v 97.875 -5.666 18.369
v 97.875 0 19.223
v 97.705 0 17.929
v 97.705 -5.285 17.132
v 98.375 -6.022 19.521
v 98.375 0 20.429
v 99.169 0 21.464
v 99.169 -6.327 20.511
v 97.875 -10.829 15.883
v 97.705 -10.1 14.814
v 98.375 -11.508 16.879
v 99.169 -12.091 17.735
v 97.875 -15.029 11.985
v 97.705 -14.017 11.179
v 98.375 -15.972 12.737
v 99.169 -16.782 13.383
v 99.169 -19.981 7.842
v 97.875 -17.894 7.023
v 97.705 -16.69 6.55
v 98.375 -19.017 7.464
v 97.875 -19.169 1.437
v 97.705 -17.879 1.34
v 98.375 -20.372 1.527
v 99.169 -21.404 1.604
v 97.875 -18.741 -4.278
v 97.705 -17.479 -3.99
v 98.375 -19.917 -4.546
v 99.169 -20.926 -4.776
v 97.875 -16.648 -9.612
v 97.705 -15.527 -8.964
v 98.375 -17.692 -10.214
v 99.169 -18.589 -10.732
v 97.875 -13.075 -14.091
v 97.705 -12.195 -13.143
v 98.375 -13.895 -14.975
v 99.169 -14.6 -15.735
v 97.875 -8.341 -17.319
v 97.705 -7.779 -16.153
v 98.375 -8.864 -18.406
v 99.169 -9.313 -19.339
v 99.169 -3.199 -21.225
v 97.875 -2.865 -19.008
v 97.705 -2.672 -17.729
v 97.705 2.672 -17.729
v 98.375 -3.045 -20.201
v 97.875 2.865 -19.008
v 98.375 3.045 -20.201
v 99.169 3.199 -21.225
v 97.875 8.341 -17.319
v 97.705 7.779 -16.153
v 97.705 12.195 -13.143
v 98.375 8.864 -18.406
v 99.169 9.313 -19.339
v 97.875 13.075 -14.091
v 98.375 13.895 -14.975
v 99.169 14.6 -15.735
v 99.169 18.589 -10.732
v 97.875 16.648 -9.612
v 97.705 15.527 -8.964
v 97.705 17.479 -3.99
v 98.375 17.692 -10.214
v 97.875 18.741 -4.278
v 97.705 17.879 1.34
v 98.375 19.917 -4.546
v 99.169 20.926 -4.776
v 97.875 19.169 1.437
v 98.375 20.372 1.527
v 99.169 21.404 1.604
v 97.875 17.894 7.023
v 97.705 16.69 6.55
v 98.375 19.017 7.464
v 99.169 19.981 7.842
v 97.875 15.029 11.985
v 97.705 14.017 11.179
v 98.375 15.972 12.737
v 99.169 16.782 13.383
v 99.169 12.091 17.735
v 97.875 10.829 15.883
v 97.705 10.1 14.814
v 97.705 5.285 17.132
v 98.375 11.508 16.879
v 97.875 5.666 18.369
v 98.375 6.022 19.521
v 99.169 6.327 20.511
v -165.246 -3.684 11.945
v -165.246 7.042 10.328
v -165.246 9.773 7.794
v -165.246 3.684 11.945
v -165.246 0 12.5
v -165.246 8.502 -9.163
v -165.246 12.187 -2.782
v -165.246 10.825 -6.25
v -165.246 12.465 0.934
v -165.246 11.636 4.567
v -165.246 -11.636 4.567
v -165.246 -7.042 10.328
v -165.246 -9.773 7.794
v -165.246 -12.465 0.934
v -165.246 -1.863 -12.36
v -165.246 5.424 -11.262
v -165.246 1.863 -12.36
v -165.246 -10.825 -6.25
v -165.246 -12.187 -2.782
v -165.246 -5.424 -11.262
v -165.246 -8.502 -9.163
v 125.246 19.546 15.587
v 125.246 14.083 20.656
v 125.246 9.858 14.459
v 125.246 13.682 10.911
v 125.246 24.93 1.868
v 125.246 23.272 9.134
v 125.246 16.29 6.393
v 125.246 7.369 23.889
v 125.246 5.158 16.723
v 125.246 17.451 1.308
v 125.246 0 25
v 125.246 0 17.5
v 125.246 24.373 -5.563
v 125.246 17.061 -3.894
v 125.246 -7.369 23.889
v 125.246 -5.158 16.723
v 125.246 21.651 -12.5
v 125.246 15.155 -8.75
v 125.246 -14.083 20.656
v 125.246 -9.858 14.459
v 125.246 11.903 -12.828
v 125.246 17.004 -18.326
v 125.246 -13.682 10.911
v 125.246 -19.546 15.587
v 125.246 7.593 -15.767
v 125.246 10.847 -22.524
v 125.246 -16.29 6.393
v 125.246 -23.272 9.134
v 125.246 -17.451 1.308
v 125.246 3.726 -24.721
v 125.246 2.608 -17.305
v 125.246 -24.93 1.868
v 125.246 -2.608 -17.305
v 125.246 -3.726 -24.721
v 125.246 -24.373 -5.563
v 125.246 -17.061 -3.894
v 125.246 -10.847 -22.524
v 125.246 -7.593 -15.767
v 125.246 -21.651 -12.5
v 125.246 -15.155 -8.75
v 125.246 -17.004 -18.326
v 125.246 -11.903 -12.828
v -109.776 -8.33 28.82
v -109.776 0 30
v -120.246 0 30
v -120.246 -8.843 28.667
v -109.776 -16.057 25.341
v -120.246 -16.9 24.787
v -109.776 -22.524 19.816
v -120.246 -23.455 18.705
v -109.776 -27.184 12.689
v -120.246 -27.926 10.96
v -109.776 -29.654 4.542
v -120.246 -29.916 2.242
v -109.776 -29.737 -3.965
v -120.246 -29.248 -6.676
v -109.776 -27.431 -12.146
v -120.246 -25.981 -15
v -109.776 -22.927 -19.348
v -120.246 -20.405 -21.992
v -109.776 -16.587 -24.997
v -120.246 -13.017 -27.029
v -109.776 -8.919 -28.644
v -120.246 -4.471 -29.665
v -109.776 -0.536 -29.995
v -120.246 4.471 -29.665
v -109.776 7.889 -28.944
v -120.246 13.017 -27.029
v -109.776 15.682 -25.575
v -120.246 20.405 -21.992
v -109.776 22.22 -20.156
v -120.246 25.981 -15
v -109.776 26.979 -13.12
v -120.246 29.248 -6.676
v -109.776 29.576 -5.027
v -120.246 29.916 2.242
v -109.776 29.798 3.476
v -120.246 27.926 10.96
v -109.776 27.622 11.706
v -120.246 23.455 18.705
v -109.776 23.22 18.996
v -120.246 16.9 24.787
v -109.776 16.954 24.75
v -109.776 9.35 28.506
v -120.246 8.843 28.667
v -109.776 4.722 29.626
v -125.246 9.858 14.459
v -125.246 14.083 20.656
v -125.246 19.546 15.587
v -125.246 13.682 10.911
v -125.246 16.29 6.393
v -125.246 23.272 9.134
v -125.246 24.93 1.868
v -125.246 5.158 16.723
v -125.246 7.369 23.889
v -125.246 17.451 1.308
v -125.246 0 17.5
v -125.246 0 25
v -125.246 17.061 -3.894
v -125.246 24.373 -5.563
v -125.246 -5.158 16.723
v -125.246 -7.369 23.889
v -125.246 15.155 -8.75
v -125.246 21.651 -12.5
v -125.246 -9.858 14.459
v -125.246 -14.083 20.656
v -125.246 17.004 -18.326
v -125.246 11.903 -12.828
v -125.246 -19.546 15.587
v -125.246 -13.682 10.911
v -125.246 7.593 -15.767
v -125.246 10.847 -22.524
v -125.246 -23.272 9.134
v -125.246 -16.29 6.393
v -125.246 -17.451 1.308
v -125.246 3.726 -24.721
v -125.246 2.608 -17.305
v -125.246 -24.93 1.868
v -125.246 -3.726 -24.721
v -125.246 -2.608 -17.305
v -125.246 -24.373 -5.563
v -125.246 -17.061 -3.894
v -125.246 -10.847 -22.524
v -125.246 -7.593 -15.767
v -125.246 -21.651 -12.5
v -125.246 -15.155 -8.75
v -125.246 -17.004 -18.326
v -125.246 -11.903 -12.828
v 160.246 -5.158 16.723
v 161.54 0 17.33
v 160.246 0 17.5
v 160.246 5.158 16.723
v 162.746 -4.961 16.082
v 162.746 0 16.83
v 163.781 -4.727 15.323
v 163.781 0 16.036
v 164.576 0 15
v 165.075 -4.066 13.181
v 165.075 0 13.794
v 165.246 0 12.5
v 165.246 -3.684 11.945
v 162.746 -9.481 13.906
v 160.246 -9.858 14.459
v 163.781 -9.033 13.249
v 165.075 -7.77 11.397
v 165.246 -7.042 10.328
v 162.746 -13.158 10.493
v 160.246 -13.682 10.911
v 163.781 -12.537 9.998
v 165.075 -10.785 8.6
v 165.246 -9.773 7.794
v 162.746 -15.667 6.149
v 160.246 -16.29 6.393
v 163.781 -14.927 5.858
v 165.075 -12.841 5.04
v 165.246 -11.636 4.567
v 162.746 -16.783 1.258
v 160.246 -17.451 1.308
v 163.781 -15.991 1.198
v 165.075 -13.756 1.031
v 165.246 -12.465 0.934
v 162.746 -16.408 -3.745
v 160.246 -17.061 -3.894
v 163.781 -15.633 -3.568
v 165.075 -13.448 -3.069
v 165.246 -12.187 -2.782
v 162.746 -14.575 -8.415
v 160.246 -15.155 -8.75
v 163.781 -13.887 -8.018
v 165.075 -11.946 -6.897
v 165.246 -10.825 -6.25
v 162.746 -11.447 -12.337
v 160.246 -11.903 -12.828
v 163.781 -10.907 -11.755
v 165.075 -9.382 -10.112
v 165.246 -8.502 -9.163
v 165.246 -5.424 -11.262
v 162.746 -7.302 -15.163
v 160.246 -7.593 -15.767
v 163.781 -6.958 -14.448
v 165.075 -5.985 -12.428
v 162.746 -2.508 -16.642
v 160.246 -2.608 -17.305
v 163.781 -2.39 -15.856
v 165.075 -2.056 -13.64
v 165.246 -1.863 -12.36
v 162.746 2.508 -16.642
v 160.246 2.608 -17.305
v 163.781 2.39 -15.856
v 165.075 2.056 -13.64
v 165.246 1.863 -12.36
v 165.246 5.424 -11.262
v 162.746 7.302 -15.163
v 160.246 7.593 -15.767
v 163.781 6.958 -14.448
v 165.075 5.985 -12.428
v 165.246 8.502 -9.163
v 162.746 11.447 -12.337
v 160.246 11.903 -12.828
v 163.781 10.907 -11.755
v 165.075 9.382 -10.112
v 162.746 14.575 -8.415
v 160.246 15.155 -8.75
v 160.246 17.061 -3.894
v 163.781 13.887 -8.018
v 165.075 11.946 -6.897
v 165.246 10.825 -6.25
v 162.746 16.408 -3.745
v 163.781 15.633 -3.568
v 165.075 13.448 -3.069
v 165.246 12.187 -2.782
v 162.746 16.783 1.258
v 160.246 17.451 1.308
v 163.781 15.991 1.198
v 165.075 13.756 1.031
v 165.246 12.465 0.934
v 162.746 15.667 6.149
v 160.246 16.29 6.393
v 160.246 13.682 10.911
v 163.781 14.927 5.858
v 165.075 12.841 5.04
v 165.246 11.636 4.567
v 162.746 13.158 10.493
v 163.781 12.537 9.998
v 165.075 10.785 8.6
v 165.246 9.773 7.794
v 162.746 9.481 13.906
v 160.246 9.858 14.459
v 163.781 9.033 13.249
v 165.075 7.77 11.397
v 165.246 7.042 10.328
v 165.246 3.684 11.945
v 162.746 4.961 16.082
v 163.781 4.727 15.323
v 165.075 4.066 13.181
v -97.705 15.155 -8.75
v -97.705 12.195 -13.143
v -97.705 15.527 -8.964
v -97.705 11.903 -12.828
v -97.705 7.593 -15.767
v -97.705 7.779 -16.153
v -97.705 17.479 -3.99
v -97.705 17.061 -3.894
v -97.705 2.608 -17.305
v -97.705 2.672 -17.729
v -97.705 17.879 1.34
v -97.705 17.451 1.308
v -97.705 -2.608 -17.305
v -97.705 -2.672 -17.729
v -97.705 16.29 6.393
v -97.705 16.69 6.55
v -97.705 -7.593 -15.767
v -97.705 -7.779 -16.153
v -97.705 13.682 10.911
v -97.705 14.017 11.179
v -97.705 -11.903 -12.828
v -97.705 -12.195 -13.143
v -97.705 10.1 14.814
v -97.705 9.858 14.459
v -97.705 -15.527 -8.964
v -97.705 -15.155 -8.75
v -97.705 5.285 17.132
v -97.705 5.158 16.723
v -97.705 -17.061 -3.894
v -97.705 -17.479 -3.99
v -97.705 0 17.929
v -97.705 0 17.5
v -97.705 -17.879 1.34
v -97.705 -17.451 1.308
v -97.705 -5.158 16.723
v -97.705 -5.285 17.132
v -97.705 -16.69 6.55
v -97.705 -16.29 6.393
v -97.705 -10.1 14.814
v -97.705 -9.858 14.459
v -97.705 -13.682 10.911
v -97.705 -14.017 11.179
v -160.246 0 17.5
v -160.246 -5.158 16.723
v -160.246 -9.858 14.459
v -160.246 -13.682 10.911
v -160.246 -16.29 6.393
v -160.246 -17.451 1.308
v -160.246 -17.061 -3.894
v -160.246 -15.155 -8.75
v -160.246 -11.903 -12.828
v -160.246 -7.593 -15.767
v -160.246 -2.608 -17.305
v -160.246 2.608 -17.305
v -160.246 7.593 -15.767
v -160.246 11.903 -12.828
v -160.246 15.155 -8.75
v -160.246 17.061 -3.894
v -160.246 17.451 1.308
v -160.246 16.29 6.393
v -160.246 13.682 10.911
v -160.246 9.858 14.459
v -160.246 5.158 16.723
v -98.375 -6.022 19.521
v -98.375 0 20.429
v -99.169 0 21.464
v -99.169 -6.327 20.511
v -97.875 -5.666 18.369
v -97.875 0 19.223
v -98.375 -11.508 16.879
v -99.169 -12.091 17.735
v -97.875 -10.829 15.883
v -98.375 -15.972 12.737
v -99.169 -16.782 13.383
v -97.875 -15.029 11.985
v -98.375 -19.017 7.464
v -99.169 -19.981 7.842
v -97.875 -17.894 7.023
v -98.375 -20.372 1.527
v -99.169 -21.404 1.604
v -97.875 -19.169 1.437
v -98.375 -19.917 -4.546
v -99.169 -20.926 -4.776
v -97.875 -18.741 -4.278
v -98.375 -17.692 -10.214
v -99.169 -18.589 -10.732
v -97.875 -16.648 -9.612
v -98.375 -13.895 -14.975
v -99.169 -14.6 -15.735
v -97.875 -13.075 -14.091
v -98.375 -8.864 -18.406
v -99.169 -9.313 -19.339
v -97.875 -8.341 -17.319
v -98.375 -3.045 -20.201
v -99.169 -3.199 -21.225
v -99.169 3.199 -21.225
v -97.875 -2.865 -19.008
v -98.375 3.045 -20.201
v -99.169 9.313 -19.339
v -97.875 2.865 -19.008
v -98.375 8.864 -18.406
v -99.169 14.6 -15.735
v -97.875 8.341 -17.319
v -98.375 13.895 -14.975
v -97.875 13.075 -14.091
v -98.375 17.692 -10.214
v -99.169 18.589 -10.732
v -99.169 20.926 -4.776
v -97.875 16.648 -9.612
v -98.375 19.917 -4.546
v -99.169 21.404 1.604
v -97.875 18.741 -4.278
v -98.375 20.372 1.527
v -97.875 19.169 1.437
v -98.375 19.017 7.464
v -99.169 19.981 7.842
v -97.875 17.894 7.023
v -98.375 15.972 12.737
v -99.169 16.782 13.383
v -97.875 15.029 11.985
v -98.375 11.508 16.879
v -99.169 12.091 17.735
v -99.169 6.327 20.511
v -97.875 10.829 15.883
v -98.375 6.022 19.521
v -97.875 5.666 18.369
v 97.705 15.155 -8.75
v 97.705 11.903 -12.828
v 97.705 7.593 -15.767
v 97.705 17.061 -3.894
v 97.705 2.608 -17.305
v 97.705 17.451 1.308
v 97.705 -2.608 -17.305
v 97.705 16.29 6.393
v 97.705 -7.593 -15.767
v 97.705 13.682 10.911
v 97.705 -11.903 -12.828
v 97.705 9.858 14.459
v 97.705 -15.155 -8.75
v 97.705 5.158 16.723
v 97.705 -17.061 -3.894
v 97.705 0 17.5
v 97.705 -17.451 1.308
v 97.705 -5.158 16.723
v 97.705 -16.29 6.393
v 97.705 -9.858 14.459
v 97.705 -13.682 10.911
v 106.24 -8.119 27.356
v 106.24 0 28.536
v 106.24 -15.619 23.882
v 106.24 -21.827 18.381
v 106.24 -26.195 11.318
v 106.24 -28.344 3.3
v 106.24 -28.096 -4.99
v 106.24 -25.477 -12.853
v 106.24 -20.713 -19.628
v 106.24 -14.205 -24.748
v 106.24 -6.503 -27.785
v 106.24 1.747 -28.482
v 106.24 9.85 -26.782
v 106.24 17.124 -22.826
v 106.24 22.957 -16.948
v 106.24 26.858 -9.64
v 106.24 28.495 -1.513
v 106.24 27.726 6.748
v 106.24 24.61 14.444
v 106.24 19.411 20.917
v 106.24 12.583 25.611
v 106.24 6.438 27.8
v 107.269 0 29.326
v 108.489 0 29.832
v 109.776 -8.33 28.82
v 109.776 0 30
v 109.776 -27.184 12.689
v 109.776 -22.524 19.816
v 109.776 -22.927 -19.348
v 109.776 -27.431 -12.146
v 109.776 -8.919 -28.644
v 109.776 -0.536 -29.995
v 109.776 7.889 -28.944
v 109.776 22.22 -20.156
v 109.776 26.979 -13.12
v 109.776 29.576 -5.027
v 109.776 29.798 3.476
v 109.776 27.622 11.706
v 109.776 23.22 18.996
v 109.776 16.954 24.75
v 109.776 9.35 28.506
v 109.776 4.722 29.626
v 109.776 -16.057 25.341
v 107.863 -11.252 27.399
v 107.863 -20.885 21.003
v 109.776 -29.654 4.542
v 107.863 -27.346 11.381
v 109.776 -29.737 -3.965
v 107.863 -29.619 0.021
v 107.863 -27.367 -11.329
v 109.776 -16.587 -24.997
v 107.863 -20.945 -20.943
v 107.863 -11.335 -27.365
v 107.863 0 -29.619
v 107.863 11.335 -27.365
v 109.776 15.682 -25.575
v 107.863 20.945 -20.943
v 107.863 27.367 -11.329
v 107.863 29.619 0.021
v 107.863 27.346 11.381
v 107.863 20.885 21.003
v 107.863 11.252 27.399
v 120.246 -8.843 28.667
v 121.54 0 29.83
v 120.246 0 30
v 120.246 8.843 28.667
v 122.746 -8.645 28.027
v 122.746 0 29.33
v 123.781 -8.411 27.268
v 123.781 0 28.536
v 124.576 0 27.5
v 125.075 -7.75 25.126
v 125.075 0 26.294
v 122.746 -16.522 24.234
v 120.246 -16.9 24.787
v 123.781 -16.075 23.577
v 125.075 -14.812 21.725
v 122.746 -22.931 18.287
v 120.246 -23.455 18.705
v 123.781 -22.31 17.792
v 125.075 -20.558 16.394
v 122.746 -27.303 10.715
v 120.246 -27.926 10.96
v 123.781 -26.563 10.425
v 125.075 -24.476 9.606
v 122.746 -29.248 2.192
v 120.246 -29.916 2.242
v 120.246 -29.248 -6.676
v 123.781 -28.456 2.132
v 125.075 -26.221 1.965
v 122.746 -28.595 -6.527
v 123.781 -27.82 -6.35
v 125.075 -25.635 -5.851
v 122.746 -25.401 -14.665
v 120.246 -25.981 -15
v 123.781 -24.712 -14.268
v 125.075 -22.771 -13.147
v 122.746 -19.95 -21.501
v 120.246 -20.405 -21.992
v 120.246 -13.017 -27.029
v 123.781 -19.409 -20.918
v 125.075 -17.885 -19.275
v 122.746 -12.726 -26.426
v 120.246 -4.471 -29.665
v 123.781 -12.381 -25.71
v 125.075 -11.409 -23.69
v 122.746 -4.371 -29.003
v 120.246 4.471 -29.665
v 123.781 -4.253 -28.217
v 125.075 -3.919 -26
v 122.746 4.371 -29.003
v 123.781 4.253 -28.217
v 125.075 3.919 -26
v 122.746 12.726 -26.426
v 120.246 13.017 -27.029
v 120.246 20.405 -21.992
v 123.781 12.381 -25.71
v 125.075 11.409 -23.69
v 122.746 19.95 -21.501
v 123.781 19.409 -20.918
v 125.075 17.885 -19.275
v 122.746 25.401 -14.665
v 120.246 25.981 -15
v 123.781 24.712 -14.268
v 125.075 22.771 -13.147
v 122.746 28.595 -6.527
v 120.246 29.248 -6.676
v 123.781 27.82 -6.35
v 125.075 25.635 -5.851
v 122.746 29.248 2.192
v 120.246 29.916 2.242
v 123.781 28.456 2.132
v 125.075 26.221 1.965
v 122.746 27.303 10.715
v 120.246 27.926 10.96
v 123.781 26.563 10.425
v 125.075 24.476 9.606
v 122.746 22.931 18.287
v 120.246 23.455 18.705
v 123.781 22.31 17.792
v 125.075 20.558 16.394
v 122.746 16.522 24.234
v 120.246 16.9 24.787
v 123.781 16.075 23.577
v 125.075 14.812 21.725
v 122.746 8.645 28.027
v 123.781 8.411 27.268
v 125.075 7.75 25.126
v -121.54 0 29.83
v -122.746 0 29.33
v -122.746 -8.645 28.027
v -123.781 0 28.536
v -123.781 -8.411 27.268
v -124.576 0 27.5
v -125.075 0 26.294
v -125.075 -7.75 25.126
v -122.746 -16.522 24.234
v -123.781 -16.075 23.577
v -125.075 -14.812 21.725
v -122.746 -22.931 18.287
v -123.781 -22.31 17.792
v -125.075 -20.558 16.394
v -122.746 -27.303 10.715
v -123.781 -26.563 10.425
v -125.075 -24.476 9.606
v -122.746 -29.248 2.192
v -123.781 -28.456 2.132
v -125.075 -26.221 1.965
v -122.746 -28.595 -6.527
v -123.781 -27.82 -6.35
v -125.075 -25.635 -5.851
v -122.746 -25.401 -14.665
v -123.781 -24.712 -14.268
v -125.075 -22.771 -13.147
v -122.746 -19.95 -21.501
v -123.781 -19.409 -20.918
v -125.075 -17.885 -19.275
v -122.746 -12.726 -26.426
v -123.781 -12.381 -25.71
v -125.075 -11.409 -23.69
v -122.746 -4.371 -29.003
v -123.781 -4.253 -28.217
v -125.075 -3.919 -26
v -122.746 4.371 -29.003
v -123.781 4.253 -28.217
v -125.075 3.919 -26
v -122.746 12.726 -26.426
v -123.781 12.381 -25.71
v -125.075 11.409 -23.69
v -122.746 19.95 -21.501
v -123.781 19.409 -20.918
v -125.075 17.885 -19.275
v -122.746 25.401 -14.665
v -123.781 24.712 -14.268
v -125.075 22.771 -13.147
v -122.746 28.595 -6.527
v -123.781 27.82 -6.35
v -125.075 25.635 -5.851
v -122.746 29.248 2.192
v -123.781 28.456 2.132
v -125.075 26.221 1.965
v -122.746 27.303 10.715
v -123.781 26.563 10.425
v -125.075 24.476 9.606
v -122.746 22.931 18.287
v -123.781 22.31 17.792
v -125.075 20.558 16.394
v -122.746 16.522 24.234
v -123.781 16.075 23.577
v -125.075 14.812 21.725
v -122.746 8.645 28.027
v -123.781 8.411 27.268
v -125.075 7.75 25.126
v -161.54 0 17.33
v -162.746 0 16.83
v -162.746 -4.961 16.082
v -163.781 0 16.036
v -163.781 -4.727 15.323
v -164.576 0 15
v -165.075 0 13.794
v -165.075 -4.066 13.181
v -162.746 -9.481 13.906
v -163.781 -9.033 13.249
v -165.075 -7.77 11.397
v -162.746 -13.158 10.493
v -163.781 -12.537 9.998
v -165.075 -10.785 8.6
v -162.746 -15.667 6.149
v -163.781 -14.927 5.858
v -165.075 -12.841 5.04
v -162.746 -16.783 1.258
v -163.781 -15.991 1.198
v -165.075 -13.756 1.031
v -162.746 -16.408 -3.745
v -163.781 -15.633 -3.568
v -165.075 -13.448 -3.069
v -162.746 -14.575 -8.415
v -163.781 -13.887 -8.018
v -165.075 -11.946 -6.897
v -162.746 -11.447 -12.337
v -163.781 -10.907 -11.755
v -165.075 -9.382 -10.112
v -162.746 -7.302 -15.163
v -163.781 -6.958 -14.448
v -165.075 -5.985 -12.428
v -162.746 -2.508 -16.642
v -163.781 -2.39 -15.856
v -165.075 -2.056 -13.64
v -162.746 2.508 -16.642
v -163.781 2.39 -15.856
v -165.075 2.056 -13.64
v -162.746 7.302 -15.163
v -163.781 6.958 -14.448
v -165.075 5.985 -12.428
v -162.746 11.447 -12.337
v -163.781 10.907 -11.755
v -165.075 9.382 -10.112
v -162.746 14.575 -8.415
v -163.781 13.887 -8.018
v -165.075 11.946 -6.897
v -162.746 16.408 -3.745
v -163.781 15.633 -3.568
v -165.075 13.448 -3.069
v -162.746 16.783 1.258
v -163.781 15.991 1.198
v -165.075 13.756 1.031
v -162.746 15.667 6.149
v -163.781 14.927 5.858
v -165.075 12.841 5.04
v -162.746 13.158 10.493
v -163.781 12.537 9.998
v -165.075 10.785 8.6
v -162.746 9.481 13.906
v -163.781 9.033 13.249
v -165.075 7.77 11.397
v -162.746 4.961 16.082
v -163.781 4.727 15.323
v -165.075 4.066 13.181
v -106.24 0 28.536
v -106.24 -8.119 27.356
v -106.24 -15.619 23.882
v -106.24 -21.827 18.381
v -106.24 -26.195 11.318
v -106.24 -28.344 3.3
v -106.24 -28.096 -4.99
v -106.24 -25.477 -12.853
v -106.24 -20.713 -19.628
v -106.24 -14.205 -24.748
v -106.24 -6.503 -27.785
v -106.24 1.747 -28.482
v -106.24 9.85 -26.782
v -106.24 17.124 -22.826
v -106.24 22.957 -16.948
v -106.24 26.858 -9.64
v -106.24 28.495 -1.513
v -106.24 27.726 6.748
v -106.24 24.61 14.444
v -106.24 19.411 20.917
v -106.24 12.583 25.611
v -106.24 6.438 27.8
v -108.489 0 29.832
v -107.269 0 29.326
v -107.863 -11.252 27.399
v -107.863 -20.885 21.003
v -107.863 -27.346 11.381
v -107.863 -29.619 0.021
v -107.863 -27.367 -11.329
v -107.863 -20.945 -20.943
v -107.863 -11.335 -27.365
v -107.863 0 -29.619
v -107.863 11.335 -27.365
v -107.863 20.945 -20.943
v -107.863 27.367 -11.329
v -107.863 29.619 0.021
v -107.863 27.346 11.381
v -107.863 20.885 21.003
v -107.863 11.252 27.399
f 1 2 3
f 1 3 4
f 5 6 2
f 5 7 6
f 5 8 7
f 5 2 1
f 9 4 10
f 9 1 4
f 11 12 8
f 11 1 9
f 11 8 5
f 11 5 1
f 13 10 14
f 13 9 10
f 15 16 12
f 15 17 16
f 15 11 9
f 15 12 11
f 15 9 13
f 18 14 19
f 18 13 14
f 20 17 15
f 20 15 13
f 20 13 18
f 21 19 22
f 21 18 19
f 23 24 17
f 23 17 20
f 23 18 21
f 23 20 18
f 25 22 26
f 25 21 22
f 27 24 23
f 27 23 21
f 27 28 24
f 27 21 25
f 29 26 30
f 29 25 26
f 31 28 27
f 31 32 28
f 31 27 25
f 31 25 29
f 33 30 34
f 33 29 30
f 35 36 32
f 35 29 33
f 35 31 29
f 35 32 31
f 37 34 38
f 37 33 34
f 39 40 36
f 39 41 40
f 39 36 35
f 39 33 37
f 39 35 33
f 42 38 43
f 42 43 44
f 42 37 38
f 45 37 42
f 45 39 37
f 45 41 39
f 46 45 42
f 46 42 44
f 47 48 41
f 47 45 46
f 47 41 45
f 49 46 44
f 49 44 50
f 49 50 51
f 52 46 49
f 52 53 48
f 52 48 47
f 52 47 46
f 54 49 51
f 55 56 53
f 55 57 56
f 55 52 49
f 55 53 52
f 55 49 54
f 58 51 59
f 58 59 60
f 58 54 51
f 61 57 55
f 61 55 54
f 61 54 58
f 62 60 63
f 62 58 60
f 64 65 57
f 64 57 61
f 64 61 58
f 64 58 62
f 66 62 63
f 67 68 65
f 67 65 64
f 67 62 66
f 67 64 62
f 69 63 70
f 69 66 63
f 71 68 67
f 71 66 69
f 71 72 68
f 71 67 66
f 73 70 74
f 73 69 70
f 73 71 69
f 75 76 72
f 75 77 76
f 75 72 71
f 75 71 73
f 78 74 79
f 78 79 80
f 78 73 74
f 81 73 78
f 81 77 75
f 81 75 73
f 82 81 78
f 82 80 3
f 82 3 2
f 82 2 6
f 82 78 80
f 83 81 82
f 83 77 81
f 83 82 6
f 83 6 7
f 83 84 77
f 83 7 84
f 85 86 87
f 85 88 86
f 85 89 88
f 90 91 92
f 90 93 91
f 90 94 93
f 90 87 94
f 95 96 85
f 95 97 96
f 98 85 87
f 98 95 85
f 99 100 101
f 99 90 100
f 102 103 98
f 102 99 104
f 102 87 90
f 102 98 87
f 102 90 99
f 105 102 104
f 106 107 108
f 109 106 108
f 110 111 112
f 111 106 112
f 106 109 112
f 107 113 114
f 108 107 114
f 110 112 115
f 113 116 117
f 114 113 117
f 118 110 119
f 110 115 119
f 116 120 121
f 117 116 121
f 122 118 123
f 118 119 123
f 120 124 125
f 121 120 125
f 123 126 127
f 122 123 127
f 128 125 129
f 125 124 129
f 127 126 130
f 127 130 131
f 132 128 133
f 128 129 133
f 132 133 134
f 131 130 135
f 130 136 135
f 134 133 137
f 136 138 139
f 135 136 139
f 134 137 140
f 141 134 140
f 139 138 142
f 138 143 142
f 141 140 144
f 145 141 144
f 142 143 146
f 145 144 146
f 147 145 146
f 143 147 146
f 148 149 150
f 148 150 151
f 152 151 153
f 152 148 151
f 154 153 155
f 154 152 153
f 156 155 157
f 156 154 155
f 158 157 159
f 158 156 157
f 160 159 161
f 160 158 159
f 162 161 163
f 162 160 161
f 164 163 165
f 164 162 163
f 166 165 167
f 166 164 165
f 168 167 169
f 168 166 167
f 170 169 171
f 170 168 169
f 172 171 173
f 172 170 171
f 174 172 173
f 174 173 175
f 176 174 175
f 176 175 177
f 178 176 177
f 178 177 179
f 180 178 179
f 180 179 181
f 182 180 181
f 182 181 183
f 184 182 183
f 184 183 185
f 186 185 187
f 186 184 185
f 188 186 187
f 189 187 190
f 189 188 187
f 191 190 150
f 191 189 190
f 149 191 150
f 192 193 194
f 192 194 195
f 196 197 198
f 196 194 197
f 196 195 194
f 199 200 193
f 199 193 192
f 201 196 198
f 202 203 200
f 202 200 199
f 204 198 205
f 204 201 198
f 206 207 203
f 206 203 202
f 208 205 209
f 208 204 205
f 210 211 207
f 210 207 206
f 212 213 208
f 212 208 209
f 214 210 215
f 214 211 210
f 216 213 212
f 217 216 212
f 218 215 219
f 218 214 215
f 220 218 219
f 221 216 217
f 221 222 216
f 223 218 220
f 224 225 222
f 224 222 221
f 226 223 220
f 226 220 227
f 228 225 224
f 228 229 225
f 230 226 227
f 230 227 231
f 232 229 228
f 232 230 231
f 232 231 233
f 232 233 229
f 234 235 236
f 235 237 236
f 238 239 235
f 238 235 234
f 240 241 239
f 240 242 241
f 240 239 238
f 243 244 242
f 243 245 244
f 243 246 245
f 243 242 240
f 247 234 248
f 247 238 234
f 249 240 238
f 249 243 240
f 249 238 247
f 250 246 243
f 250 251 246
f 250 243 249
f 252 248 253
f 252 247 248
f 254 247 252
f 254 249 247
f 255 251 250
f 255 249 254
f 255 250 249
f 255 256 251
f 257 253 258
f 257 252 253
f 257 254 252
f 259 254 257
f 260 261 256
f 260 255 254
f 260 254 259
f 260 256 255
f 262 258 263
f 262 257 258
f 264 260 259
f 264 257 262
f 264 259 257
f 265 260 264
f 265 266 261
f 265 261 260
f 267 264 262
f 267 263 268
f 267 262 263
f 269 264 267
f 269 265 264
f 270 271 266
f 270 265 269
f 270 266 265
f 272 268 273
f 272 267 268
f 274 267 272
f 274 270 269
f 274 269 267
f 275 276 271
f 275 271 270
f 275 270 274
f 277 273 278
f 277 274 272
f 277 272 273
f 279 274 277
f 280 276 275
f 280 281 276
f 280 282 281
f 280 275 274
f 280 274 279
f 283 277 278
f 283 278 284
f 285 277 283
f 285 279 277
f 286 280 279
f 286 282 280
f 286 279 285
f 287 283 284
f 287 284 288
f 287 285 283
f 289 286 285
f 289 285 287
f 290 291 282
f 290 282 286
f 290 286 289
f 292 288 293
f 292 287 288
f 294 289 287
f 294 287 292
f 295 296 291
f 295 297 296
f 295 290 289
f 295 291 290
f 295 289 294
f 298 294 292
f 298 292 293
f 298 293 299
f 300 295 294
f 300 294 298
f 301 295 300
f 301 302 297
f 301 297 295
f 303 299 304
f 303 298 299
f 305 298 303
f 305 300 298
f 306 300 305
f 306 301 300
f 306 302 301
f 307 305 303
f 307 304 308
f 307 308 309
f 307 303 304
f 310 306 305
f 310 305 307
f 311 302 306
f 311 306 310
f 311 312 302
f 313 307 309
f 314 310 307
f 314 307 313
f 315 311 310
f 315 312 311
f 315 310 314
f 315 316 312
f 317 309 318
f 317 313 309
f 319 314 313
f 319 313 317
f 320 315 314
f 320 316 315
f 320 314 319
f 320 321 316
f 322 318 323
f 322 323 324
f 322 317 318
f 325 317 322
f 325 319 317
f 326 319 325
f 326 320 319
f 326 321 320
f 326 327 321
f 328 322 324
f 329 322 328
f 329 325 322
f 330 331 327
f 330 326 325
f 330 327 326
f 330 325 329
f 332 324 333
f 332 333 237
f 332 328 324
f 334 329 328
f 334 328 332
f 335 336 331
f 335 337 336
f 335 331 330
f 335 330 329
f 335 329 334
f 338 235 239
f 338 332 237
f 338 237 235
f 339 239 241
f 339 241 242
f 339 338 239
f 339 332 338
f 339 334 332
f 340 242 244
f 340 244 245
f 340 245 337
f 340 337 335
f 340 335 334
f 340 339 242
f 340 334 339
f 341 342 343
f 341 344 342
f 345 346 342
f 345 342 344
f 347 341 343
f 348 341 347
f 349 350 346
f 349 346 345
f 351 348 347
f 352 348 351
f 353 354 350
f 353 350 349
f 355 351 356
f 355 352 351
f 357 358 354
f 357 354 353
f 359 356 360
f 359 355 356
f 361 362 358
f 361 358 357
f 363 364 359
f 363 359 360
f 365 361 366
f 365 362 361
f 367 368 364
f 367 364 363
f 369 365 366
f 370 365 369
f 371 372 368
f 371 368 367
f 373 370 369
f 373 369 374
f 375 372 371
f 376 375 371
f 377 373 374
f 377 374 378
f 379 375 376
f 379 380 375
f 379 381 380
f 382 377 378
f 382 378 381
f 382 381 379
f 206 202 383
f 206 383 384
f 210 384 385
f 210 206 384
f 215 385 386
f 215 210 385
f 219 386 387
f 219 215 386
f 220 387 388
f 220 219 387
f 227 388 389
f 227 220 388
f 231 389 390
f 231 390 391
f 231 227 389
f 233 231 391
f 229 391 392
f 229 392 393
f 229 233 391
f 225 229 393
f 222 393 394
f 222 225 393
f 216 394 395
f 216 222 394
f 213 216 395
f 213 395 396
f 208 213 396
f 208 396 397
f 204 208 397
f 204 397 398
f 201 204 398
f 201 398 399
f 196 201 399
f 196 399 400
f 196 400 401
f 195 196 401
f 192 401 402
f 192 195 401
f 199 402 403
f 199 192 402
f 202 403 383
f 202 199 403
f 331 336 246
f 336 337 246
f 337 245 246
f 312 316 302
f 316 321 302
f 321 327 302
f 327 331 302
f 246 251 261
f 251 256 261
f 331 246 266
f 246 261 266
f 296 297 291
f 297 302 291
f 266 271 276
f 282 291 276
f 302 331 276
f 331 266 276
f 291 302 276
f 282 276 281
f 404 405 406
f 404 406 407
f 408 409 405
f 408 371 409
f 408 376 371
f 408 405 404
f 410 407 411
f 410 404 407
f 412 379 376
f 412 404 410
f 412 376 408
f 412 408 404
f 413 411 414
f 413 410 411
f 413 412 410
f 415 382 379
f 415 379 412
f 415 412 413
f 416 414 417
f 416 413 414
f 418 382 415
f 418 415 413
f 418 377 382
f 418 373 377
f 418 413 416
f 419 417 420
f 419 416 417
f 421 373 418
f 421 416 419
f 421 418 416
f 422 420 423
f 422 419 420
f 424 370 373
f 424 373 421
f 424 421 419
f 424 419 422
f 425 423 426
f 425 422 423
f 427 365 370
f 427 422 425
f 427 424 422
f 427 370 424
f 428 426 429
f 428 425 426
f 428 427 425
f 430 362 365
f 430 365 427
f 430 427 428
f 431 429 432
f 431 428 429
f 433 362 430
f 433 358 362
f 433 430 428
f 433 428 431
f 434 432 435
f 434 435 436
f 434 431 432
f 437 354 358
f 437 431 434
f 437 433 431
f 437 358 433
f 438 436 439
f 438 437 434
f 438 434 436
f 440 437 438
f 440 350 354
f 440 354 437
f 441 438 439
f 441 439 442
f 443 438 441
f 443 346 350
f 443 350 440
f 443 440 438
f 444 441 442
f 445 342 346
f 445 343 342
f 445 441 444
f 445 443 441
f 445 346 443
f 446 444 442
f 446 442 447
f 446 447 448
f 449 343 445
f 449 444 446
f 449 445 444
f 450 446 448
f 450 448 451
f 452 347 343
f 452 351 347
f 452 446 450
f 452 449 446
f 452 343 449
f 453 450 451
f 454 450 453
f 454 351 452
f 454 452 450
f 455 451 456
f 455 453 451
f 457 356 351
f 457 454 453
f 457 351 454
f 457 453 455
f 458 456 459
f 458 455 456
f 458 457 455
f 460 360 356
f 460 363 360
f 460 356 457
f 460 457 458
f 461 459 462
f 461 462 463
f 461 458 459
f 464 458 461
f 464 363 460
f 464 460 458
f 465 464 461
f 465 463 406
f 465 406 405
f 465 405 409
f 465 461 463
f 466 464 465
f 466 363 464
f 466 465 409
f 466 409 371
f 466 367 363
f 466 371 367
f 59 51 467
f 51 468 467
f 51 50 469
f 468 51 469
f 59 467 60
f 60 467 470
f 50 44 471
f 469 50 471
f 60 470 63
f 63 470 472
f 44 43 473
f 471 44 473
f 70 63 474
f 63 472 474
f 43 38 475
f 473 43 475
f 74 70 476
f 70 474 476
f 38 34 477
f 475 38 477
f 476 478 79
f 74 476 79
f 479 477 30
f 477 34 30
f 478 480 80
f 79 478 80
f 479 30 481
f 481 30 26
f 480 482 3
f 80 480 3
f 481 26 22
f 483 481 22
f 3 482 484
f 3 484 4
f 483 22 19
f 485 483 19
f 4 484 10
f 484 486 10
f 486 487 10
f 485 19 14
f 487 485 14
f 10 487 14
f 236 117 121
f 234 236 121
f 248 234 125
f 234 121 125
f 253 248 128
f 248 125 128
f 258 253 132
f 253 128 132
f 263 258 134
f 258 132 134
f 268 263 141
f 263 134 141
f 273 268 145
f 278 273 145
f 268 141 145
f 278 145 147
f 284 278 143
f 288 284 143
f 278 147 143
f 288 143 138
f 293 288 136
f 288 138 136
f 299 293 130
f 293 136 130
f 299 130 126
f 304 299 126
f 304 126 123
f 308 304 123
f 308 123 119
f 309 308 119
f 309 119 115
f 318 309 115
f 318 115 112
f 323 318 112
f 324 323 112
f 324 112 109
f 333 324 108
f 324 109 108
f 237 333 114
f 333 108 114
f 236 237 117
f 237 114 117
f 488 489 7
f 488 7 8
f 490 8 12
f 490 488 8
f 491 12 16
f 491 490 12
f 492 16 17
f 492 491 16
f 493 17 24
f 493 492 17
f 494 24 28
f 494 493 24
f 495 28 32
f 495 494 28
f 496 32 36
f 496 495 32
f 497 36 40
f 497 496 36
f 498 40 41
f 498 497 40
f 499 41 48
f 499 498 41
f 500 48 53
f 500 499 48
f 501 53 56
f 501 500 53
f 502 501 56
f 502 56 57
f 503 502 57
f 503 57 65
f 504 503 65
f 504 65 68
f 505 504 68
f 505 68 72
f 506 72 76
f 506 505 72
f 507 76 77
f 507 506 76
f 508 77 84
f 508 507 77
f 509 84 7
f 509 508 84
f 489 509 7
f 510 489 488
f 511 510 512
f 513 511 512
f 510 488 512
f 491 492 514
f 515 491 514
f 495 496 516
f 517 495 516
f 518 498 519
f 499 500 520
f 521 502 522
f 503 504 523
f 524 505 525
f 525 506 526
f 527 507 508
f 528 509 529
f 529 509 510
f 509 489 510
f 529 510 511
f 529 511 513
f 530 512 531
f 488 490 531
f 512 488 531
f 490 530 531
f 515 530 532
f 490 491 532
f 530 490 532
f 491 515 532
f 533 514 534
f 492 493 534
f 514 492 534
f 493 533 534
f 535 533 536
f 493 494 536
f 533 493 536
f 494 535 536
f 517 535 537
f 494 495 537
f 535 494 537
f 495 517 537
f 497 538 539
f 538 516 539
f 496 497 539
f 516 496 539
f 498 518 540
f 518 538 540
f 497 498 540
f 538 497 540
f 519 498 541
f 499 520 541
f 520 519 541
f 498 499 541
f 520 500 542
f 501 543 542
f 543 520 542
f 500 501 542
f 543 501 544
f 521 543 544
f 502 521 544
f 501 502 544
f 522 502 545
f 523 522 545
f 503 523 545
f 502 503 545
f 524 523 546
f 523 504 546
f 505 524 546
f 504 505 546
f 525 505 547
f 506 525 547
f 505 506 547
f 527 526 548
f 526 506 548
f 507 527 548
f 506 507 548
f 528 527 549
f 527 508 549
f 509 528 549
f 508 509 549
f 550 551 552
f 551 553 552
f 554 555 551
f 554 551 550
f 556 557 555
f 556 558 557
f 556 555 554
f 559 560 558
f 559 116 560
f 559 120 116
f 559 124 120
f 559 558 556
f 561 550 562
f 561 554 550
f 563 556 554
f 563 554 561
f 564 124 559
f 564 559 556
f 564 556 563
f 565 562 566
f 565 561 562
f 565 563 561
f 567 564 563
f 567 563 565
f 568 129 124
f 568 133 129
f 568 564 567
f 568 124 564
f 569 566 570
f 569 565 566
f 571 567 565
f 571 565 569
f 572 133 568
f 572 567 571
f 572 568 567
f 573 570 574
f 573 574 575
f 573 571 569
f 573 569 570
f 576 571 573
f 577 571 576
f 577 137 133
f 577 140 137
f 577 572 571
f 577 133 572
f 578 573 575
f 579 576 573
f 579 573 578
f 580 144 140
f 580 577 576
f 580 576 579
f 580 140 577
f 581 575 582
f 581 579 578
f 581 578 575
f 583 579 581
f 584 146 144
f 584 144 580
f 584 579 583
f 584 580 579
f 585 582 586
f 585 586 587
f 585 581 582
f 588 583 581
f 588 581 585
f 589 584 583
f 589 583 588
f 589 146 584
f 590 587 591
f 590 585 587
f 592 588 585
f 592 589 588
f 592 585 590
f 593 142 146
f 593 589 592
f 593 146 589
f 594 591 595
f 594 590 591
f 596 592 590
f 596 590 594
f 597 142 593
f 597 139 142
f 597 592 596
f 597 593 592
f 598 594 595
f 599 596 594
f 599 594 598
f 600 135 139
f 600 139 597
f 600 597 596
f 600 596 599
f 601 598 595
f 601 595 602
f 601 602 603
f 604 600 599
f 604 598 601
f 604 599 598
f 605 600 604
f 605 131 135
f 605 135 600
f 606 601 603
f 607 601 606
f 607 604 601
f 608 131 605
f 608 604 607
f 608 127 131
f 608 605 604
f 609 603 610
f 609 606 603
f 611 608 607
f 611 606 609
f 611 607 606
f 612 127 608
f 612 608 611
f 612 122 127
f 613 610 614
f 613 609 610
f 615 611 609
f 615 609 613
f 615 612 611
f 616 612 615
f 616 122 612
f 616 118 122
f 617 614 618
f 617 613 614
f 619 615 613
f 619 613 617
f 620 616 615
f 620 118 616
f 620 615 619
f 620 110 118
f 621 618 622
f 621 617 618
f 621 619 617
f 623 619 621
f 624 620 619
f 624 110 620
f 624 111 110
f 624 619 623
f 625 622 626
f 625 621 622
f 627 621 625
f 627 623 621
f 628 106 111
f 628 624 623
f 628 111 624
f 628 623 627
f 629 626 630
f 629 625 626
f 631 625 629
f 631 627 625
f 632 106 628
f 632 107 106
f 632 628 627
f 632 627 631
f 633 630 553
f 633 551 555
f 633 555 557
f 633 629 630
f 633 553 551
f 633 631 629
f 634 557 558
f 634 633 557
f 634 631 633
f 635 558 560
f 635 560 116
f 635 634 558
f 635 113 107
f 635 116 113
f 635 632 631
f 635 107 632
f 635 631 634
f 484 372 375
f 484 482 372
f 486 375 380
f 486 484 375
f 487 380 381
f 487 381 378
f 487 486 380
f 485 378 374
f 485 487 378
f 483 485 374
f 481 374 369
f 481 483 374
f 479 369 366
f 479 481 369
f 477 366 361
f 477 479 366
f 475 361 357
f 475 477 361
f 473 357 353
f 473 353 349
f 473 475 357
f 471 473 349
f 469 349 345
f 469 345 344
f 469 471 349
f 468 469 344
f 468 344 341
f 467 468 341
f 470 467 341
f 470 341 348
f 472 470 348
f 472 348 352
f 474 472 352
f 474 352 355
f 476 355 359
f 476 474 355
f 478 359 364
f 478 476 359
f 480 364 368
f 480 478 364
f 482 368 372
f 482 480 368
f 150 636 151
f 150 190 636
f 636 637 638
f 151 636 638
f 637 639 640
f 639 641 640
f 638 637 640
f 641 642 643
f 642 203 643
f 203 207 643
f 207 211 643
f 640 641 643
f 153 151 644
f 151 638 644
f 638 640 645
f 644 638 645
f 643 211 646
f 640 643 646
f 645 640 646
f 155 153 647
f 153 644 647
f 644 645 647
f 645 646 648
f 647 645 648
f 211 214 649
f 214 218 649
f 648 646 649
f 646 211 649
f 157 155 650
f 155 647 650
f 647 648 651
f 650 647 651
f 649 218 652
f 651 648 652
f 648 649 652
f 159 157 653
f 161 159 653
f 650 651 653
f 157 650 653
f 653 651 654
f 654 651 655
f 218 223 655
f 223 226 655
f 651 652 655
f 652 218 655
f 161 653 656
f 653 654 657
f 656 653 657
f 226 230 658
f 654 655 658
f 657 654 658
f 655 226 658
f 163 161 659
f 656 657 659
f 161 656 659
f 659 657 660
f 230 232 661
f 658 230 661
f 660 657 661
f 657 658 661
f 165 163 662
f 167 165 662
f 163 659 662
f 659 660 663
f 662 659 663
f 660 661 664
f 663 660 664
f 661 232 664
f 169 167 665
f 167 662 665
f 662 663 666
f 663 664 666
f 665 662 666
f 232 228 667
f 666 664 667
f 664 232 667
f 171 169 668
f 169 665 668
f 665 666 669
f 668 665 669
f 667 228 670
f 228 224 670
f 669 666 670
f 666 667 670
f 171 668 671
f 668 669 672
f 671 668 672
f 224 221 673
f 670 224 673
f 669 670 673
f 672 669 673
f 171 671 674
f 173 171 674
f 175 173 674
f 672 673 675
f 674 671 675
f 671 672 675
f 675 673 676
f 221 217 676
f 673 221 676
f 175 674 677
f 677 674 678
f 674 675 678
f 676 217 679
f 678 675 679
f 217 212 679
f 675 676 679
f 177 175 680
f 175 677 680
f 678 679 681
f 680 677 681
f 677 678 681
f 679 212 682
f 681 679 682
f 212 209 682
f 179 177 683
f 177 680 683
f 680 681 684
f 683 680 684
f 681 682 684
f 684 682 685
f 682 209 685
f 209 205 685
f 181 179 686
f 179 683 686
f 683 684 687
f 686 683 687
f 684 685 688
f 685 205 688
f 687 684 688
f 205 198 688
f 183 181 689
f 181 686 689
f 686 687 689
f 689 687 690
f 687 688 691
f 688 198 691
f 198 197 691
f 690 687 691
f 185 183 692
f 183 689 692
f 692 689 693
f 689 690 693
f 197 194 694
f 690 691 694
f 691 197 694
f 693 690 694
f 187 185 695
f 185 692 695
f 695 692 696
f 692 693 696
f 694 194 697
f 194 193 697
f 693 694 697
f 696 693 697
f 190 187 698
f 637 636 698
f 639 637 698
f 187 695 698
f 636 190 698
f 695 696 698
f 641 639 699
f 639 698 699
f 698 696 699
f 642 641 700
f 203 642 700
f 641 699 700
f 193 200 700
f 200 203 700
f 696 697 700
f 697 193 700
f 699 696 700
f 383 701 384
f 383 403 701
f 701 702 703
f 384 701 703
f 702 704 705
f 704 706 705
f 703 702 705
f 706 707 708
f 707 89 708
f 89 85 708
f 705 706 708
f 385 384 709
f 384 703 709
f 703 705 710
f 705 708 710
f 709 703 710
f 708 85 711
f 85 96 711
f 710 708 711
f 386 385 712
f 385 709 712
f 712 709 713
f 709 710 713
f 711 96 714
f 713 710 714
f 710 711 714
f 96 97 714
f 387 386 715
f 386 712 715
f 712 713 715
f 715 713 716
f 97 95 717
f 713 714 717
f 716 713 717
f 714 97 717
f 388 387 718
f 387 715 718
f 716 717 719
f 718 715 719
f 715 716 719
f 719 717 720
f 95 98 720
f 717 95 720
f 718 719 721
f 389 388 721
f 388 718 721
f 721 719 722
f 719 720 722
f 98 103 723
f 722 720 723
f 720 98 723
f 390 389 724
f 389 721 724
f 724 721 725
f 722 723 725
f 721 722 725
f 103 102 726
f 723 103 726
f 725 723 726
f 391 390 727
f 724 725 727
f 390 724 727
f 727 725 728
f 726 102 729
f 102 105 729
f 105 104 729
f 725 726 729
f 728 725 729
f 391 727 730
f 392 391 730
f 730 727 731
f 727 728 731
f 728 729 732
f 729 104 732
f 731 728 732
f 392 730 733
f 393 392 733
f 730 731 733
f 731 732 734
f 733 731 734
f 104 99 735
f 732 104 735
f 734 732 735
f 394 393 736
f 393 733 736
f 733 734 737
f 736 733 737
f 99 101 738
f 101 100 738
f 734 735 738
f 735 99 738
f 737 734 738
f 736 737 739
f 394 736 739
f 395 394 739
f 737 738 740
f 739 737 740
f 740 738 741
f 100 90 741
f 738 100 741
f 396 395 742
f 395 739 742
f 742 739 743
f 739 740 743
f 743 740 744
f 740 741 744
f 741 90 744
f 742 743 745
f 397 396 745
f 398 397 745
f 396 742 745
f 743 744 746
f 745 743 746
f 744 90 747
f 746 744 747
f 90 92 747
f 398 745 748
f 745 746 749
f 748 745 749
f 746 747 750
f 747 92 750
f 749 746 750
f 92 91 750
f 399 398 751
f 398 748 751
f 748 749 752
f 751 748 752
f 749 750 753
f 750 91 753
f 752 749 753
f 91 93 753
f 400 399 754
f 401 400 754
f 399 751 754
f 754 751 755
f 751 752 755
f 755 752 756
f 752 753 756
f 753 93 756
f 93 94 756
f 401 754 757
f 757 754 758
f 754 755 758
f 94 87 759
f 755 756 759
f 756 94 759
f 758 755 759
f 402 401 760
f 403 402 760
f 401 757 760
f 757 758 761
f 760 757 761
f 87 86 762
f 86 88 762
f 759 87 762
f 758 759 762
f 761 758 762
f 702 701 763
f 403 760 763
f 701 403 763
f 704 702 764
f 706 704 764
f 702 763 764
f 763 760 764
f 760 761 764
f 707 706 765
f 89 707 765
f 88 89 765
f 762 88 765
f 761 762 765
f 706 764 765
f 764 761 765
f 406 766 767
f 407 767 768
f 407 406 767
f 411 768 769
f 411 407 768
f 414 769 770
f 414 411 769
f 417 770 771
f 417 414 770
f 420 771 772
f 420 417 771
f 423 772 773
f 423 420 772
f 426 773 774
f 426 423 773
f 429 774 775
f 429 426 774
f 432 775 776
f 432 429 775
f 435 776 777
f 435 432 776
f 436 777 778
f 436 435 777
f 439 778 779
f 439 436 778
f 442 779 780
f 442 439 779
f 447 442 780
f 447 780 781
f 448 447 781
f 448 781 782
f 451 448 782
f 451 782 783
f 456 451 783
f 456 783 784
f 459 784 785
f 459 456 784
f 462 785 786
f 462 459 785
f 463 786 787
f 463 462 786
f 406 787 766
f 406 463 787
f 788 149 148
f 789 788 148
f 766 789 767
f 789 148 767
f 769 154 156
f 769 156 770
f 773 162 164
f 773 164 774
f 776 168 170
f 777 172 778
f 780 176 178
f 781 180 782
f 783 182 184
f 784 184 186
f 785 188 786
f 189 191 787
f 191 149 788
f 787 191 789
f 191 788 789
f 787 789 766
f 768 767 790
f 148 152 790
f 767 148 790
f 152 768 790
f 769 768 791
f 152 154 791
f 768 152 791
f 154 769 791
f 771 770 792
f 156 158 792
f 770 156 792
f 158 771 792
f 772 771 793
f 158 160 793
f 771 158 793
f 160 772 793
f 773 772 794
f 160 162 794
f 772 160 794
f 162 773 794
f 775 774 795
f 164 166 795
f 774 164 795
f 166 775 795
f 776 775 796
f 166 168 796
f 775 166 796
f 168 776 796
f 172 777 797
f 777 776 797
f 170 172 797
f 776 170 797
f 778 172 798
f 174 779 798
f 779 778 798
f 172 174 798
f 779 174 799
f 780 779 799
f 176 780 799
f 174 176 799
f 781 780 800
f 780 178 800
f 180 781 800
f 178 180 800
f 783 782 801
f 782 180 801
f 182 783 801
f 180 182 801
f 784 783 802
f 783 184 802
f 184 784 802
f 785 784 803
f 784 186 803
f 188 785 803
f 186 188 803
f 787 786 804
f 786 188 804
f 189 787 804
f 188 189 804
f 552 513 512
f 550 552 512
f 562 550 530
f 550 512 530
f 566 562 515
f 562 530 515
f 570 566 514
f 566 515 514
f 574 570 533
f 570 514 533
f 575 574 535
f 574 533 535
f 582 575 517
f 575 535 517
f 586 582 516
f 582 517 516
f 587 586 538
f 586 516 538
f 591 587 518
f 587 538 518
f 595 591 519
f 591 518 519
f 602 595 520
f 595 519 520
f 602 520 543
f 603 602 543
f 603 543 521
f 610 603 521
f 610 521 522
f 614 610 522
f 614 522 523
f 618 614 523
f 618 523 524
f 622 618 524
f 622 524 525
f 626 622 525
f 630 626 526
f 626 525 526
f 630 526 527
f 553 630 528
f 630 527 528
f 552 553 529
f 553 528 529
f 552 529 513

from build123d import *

# Parameters (mm, degrees)
F3_SIZE = 10
F4_R    = 5
F5_R    = 5


with BuildPart() as f1:
    # F0 (on Front) → F1 (revolve)
    with BuildSketch(Plane.XZ):
        Polygon((0, 17.5), (0, 0), (165.2458313006, 0), (165.2458313006, 17.5), (125.2458313006, 17.5), (125.2458313006, 30), (97.7048704189, 30), (97.7048704189, 17.5), align=None)
    revolve(axis=Axis((82.6229156503, 0, 0), (1, 0, 0)))

    # F2: F1 across face


with BuildPart() as f1_1:
    add(f1.part)
    add(f1.part.mirror(Plane(origin=(0, 0, 0), x_dir=(0, -1, 0), z_dir=(-1, 0, 0))))

    # F3
    f3_edges = [f1_1.edges().sort_by_distance(p)[0] for p in [
        (97.70487, 0, -30),
        (-97.70487, 0, -30),
    ]]
    chamfer(f3_edges, length=F3_SIZE)

    # F4
    f4_edges = [f1_1.edges().sort_by_distance(p)[0] for p in [
        (-107.70487, 0, -30),
        (-97.70487, 0, -20),
        (97.70487, 0, -20),
        (107.70487, 0, -30),
    ]]
    fillet(f4_edges, radius=F4_R)

    # F5
    f5_edges = [f1_1.edges().sort_by_distance(p)[0] for p in [
        (-165.245831, 0, -17.5),
        (165.245831, 0, -17.5),
        (125.245831, 0, -30),
        (-125.245831, 0, -30),
    ]]
    fillet(f5_edges, radius=F5_R)


solid = f1_1.part
